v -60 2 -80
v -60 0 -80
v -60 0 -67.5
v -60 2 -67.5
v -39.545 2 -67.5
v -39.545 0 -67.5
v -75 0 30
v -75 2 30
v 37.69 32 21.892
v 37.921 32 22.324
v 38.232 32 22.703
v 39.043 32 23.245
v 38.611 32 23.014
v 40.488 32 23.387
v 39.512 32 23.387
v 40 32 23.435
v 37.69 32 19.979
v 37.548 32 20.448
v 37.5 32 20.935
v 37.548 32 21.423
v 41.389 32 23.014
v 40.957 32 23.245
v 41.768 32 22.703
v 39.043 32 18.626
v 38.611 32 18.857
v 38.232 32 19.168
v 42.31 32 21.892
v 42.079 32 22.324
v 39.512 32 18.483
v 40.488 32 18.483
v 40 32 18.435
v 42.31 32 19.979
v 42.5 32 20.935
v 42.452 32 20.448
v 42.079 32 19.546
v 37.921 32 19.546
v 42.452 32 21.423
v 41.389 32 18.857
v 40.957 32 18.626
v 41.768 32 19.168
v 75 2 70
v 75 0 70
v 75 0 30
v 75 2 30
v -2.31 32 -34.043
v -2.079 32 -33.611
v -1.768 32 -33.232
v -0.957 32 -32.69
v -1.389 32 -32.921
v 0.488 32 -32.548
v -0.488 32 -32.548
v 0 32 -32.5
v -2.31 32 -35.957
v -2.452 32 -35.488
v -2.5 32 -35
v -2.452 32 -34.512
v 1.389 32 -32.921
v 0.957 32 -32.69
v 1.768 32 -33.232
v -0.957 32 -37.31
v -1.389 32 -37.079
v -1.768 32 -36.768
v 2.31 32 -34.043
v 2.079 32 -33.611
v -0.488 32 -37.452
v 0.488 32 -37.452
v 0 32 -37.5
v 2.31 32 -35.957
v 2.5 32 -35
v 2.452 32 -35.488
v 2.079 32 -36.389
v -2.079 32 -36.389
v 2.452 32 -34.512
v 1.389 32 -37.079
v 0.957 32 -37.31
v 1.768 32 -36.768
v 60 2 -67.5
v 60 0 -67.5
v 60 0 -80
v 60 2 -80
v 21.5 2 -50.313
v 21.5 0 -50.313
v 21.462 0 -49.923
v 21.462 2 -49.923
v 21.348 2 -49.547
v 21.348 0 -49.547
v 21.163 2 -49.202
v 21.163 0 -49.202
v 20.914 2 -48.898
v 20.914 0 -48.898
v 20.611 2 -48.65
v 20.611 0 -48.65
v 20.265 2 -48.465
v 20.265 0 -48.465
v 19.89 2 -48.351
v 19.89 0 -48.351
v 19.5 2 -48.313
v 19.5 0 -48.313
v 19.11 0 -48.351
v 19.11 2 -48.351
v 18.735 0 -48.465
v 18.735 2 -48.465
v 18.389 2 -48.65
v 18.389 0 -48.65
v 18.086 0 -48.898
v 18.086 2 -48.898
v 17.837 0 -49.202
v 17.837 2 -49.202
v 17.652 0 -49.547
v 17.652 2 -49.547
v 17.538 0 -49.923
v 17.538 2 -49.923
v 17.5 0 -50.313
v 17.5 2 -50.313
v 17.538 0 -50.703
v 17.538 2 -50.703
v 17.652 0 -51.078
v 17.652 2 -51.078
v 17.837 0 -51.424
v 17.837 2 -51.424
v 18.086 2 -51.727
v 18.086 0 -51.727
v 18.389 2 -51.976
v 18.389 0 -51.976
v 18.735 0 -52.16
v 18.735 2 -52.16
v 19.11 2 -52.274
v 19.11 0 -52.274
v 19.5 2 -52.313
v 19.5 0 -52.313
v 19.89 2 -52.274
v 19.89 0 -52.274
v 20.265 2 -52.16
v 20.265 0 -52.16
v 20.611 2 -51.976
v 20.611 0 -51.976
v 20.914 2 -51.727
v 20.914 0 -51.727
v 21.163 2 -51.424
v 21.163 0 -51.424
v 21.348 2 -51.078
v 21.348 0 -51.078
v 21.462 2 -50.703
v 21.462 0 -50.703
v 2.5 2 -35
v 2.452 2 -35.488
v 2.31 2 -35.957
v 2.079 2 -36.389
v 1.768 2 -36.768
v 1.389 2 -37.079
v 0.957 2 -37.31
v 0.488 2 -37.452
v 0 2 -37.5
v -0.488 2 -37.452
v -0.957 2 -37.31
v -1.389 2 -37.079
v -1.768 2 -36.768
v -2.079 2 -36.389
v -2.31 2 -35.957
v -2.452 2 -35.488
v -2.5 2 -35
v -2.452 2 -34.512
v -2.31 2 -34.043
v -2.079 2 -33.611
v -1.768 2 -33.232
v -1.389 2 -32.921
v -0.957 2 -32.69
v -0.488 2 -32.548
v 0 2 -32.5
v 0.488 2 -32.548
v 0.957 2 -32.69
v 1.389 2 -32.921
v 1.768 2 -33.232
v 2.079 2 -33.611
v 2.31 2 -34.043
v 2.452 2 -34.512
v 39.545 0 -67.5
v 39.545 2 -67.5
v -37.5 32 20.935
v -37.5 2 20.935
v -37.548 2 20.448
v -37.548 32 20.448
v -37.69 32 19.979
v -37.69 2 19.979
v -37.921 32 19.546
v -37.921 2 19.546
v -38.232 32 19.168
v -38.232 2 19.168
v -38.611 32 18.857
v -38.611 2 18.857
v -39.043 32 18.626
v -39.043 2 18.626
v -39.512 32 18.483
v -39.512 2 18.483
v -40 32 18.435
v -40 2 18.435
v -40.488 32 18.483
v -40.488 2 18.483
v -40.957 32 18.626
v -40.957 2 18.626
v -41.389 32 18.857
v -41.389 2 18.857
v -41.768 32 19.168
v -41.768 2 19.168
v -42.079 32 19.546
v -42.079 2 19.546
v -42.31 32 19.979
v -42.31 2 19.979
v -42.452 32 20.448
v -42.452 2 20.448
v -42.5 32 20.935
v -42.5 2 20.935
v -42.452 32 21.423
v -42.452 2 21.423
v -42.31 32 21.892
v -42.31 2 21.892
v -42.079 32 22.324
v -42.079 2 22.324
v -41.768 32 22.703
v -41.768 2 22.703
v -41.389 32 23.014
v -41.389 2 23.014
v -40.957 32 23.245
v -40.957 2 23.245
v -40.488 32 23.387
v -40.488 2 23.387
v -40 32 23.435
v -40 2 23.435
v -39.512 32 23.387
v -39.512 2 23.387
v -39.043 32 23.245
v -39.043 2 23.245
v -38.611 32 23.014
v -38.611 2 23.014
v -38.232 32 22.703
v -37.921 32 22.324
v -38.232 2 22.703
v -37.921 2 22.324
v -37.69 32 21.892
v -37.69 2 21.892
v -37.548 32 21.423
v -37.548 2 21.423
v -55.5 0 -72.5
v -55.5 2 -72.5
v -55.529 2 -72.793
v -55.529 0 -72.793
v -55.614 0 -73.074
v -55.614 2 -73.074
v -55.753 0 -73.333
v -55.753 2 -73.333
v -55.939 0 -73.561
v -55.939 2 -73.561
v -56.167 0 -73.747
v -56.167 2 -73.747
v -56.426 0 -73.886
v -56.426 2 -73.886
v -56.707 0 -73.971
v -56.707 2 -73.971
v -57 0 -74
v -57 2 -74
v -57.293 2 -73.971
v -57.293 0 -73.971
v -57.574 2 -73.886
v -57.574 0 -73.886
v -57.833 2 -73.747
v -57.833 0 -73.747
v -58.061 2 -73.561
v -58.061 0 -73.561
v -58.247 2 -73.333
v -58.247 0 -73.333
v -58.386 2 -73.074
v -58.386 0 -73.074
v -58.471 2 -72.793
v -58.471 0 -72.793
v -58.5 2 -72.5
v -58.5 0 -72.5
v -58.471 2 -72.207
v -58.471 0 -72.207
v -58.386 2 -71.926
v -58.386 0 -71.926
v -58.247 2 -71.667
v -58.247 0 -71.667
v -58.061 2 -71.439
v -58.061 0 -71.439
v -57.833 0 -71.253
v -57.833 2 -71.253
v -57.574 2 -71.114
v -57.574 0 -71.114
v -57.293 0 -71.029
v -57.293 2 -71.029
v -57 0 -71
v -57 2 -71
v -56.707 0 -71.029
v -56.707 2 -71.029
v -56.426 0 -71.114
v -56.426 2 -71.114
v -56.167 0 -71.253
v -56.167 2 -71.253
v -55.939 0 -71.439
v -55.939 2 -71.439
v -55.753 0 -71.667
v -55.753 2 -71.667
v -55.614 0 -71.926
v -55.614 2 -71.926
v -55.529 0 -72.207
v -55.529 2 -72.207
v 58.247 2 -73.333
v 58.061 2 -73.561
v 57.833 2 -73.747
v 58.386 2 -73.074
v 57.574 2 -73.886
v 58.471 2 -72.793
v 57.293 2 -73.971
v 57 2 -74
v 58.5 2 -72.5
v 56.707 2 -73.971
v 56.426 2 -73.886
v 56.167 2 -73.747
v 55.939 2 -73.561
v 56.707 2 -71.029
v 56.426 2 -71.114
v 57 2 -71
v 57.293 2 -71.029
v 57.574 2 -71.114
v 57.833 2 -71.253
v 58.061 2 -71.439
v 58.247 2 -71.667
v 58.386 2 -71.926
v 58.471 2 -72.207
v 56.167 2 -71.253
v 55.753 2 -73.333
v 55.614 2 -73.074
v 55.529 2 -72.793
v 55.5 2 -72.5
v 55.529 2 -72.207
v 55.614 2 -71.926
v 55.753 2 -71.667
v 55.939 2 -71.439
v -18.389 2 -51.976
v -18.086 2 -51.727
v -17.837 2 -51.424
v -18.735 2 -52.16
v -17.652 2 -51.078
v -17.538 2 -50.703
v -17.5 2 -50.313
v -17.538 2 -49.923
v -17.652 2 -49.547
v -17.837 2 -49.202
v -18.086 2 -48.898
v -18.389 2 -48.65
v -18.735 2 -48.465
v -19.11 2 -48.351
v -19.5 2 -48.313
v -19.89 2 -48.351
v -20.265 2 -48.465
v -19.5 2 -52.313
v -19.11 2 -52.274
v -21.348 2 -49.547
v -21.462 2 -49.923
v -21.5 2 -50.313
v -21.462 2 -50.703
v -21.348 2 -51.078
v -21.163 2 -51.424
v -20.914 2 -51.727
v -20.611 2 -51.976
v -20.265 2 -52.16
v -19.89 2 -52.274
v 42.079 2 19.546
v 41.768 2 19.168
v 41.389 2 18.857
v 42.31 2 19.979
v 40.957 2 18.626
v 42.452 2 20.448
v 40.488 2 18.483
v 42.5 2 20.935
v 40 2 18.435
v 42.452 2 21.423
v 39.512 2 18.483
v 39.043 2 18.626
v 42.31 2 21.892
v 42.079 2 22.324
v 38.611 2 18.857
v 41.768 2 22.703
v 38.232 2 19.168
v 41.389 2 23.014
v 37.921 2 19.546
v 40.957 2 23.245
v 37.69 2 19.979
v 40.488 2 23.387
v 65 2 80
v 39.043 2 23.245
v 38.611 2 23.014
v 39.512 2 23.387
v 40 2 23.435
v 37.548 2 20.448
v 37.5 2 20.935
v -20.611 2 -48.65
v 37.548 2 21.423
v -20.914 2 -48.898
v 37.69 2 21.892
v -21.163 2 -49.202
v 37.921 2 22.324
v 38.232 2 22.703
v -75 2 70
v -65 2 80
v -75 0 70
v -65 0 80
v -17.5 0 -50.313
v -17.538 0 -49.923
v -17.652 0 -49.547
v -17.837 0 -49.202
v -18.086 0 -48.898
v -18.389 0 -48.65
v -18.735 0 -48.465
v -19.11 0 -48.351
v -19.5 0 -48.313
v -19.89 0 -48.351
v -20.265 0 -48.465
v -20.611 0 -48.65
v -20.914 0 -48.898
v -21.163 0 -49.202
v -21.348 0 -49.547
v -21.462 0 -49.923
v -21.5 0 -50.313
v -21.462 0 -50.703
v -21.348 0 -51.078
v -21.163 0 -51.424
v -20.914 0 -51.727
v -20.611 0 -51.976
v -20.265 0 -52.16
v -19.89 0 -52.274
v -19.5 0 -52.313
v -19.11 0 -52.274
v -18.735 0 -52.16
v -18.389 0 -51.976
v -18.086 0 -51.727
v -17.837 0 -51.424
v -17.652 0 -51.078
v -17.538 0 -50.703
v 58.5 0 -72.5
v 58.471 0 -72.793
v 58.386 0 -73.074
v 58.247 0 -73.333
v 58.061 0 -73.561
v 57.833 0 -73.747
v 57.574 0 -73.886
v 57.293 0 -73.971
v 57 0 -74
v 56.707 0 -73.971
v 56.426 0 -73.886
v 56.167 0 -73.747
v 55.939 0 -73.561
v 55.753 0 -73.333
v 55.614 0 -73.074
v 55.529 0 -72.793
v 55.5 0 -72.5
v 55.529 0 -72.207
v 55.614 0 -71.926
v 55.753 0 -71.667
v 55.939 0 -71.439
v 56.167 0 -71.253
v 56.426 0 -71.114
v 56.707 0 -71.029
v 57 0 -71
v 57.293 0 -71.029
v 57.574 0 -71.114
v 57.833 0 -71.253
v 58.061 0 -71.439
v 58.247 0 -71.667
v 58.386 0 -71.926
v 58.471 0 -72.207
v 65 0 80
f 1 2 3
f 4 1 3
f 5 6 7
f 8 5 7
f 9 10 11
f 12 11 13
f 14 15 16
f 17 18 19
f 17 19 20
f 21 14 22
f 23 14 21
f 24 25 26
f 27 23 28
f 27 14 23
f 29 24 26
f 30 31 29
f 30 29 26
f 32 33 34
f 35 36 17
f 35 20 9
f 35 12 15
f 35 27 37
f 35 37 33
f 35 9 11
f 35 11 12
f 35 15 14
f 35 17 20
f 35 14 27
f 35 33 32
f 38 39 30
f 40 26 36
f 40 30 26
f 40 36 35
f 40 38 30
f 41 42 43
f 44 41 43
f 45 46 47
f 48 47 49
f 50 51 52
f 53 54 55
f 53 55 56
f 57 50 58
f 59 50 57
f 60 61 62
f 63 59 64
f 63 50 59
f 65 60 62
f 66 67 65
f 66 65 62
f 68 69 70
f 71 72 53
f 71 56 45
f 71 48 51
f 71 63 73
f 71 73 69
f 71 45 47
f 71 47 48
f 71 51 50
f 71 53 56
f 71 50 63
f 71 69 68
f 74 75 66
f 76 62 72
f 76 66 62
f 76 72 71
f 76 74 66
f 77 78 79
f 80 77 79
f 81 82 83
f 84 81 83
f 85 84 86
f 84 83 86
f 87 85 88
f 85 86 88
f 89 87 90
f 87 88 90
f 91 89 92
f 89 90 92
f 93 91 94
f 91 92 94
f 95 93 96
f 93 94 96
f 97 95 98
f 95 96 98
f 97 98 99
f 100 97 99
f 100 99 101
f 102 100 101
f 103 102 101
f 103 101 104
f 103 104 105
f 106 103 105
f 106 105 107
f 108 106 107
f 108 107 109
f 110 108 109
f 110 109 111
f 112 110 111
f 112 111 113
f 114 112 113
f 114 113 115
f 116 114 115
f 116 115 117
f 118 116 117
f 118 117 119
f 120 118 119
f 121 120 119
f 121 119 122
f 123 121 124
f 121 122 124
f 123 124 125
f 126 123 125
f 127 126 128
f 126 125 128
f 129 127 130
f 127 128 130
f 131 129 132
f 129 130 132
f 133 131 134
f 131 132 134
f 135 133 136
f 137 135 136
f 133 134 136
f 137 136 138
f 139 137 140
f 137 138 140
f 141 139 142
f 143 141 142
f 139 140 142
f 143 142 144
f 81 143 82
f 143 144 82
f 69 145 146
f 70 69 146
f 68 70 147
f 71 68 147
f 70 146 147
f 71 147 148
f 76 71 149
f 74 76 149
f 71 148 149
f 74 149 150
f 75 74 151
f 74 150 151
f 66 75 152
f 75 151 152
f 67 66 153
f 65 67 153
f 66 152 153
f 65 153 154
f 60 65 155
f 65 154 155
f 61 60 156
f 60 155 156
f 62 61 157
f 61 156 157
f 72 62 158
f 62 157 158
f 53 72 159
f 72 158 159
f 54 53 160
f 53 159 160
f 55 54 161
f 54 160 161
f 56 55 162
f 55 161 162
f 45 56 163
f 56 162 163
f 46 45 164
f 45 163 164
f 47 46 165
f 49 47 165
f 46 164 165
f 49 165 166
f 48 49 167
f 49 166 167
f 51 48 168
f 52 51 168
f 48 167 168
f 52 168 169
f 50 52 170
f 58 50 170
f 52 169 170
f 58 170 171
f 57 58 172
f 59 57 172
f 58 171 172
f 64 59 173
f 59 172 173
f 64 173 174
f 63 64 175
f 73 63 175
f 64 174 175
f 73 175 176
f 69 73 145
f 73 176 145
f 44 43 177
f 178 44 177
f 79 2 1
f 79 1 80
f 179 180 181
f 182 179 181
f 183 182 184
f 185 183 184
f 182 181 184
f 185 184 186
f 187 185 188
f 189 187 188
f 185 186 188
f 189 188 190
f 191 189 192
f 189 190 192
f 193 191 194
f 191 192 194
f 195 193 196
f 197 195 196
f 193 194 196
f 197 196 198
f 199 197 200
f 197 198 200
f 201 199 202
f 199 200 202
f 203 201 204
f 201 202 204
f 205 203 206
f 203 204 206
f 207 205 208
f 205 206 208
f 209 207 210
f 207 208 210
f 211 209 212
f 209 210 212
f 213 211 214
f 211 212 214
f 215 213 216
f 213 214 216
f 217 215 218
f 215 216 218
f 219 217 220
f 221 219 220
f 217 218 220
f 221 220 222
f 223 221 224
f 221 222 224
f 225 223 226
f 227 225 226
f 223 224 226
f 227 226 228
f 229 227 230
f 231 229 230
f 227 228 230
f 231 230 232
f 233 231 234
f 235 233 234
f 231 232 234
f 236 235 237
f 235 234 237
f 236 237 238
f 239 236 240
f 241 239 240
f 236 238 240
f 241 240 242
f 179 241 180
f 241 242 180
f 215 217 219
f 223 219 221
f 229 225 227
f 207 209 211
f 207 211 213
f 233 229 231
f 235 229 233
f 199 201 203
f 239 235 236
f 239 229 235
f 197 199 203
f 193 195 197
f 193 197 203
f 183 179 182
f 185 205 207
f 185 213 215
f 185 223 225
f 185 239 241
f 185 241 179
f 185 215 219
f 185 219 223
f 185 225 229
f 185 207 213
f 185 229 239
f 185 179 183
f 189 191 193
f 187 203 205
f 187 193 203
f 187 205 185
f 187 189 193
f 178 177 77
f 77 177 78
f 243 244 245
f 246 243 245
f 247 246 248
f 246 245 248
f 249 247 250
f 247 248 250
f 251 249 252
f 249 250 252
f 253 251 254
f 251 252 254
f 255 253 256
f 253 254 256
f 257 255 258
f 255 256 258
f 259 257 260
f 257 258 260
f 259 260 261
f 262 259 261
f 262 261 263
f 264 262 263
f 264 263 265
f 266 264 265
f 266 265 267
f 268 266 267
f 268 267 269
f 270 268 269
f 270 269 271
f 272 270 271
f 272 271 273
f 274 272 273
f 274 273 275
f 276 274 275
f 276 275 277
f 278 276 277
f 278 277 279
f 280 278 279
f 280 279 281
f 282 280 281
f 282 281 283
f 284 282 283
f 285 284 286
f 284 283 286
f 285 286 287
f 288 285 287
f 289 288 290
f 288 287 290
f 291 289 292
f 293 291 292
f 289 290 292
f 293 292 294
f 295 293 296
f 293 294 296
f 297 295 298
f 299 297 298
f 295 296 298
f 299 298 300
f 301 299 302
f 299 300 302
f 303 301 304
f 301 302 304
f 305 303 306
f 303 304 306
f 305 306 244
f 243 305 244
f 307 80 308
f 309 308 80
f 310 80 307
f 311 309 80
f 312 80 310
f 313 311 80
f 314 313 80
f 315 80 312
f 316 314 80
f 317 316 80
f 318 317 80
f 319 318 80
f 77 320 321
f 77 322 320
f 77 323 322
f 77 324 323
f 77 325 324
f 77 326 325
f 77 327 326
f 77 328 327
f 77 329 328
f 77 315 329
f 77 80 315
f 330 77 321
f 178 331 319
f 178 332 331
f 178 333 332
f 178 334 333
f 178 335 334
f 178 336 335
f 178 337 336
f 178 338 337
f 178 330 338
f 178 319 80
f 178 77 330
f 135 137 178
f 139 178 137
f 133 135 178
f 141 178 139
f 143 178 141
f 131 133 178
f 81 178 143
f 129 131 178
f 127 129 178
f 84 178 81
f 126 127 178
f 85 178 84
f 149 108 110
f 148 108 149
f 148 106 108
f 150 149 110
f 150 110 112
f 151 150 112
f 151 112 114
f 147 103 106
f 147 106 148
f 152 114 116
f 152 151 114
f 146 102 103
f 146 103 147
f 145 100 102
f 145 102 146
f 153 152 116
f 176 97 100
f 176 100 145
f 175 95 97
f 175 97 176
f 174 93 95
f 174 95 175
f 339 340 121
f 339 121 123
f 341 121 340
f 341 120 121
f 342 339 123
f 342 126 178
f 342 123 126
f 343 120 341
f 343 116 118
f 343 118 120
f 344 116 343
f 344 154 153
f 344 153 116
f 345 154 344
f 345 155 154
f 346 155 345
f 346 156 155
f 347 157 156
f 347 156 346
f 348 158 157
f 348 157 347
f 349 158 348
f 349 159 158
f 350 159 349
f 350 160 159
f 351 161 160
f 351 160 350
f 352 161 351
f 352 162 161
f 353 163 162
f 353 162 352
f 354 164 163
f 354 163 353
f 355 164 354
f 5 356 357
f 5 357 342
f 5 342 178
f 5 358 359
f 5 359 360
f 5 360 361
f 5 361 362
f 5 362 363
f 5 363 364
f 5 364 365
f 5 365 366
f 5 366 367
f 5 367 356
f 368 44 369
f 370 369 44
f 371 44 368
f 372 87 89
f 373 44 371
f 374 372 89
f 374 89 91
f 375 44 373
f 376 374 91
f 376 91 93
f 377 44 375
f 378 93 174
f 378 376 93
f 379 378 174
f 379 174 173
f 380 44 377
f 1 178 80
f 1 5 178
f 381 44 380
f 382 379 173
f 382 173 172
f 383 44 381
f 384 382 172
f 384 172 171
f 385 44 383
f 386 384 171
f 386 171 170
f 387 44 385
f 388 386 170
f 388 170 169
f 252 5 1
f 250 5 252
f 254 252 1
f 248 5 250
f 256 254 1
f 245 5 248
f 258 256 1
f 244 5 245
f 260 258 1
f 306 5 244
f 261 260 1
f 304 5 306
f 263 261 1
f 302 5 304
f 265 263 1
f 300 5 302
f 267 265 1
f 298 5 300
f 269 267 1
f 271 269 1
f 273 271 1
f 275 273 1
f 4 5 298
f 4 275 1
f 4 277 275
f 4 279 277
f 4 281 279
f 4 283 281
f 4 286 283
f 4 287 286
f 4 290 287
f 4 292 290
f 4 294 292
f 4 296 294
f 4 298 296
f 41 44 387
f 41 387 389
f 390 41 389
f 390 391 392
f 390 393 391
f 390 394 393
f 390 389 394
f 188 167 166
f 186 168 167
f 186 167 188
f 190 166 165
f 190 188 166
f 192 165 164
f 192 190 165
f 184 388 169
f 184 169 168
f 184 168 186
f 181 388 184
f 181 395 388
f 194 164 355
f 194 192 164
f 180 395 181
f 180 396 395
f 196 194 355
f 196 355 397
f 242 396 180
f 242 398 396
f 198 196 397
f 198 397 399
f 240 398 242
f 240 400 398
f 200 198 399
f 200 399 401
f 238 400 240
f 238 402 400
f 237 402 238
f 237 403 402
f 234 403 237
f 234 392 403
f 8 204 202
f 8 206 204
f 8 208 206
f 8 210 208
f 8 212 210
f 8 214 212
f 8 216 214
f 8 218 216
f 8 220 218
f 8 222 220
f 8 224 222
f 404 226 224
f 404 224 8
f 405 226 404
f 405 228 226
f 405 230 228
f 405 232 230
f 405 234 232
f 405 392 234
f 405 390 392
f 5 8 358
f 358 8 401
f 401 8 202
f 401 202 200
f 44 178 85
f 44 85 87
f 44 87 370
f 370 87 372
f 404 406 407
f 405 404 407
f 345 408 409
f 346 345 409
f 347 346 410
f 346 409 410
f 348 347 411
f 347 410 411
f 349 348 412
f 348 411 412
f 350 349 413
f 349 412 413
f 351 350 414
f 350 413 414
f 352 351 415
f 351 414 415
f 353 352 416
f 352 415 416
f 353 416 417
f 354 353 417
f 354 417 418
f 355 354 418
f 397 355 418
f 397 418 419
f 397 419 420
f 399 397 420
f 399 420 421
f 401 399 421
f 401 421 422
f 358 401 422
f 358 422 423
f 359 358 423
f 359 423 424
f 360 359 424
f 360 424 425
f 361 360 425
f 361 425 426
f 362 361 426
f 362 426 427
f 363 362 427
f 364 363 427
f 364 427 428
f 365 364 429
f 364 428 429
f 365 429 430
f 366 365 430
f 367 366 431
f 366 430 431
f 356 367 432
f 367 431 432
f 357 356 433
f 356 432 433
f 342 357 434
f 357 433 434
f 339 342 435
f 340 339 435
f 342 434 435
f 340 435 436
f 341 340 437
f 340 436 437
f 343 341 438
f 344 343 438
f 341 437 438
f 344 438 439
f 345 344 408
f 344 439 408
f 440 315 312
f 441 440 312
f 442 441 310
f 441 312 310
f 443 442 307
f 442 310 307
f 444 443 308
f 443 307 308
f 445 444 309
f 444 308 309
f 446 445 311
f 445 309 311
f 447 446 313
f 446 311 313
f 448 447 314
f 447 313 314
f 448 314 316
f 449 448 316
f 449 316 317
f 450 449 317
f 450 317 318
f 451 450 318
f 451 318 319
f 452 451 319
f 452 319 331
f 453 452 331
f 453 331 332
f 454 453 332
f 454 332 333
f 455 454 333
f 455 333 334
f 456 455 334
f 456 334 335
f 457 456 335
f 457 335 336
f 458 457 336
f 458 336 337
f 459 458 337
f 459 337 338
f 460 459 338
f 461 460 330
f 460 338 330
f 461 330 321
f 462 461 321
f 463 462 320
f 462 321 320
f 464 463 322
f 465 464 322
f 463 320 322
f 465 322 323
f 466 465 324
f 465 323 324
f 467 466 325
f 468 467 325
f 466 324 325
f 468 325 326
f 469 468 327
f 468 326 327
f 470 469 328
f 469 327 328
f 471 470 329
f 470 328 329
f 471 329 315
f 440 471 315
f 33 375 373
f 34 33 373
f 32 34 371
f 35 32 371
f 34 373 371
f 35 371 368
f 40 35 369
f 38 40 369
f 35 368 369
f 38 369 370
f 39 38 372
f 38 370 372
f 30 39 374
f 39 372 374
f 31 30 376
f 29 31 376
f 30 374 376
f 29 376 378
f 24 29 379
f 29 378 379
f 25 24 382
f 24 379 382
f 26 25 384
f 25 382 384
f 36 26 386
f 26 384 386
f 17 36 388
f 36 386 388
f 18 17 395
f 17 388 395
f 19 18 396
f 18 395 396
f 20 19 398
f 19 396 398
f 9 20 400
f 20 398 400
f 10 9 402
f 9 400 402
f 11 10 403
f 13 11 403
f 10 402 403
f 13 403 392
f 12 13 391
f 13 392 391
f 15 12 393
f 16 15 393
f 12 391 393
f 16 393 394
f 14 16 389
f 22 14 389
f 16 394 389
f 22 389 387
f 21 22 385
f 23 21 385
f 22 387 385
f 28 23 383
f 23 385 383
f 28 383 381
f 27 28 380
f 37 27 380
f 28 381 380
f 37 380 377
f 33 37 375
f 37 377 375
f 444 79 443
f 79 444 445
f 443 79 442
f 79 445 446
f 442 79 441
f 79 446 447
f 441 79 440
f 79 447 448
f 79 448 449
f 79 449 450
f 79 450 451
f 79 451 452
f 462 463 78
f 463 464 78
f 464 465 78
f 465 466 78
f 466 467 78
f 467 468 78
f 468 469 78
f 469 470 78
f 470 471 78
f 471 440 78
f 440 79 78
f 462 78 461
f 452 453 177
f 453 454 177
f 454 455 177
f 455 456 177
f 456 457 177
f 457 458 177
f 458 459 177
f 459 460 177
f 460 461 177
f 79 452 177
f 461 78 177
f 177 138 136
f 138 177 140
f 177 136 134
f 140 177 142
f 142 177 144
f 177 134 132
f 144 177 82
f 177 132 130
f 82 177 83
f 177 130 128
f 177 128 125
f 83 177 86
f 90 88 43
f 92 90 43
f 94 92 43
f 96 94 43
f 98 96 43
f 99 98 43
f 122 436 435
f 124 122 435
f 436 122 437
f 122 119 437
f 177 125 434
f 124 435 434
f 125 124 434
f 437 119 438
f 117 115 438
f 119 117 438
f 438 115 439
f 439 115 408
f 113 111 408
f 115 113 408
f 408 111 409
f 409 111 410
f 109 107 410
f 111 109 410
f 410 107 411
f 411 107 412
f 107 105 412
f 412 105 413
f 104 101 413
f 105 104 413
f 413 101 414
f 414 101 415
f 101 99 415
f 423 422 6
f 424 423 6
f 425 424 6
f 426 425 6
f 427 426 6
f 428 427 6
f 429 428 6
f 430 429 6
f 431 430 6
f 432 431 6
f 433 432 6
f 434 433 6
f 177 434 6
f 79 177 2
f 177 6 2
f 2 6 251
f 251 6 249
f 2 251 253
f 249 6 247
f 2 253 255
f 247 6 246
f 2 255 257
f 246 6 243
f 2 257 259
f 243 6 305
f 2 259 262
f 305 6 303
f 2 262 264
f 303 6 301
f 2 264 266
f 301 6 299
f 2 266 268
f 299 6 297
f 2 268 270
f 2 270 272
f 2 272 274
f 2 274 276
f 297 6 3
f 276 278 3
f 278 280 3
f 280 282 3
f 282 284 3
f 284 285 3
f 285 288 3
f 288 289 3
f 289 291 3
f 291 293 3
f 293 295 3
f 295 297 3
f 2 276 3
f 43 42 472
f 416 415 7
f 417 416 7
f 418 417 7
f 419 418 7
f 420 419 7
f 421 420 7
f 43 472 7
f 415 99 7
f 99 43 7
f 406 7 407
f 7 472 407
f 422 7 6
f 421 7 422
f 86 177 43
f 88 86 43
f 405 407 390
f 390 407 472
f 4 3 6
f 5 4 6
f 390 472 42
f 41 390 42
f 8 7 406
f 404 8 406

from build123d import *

# Parameters (mm, degrees)
BOSS_EXTRUDE1_DEPTH = 2
CUT_EXTRUDE1_REACH  = 4
SKETCH2_R           = 2
BOSS_EXTRUDE2_DEPTH = 2
CUT_EXTRUDE2_REACH  = 4
SKETCH5_R           = 1.5
SKETCH6_R           = 2.5
BOSS_EXTRUDE3_DEPTH = 30


with BuildPart() as part:
    # Sketch1 → Boss-Extrude1 (new body)
    with BuildSketch(Plane(origin=(0, 0, 0), x_dir=(1, 0, 0), z_dir=(0, 1, 0))):
        Polygon((-75, -70), (-65, -80), (65, -80), (75, -70), (75, -30), (35, 80), (-35, 80), (-75, -30), align=None)
    extrude(amount=BOSS_EXTRUDE1_DEPTH)

    # Sketch2 → Cut-Extrude1 (cut, up to next)
    with BuildSketch(Plane.XZ, mode=Mode.PRIVATE) as cut_extrude1_sk1:
        with Locations((-19.5, -50.31270399)):
            Circle(SKETCH2_R)
    cut_extrude1_tool1 = extrude(cut_extrude1_sk1.sketch, amount=-CUT_EXTRUDE1_REACH, mode=Mode.PRIVATE) & part.part
    add(cut_extrude1_tool1.solids().sort_by_distance((-19.5, 0, -50.312704))[0], mode=Mode.SUBTRACT)
    # Sketch2 → Cut-Extrude1 (cut, up to next)
    with BuildSketch(Plane.XZ, mode=Mode.PRIVATE) as cut_extrude1_sk2:
        with Locations((19.5, -50.31270399)):
            Circle(SKETCH2_R)
    cut_extrude1_tool2 = extrude(cut_extrude1_sk2.sketch, amount=-CUT_EXTRUDE1_REACH, mode=Mode.PRIVATE) & part.part
    add(cut_extrude1_tool2.solids().sort_by_distance((19.5, 0, -50.312704))[0], mode=Mode.SUBTRACT)

    # Sketch3 → Boss-Extrude2 (add)
    with BuildSketch(Plane.XZ):
        Polygon((-35, -80), (-60, -80), (-60, -67.5), (60, -67.5), (60, -80), align=None)
    extrude(amount=-BOSS_EXTRUDE2_DEPTH)

    # Sketch5 → Cut-Extrude2 (cut, up to next)
    with BuildSketch(Plane(origin=(0, 2, 0), x_dir=(1, 0, 0), z_dir=(0, 1, 0)), mode=Mode.PRIVATE) as cut_extrude2_sk1:
        with Locations((57, 72.5)):
            Circle(SKETCH5_R)
    cut_extrude2_tool1 = extrude(cut_extrude2_sk1.sketch, amount=-CUT_EXTRUDE2_REACH, mode=Mode.PRIVATE) & part.part
    add(cut_extrude2_tool1.solids().sort_by_distance((57, 2, -72.5))[0], mode=Mode.SUBTRACT)
    # Sketch5 → Cut-Extrude2 (cut, up to next)
    with BuildSketch(Plane(origin=(0, 2, 0), x_dir=(1, 0, 0), z_dir=(0, 1, 0)), mode=Mode.PRIVATE) as cut_extrude2_sk2:
        with Locations((-57, 72.5)):
            Circle(SKETCH5_R)
    cut_extrude2_tool2 = extrude(cut_extrude2_sk2.sketch, amount=-CUT_EXTRUDE2_REACH, mode=Mode.PRIVATE) & part.part
    add(cut_extrude2_tool2.solids().sort_by_distance((-57, 2, -72.5))[0], mode=Mode.SUBTRACT)

    # Sketch6 → Boss-Extrude3 (add)
    with BuildSketch(Plane(origin=(0, 2, 0), x_dir=(1, 0, 0), z_dir=(0, 1, 0))):
        with Locations((-40, -20.935279196)):
            Circle(SKETCH6_R)
        with Locations((40, -20.935279196)):
            Circle(SKETCH6_R)
        with Locations((0, 35)):
            Circle(SKETCH6_R)
    extrude(amount=BOSS_EXTRUDE3_DEPTH)


solid = part.part
